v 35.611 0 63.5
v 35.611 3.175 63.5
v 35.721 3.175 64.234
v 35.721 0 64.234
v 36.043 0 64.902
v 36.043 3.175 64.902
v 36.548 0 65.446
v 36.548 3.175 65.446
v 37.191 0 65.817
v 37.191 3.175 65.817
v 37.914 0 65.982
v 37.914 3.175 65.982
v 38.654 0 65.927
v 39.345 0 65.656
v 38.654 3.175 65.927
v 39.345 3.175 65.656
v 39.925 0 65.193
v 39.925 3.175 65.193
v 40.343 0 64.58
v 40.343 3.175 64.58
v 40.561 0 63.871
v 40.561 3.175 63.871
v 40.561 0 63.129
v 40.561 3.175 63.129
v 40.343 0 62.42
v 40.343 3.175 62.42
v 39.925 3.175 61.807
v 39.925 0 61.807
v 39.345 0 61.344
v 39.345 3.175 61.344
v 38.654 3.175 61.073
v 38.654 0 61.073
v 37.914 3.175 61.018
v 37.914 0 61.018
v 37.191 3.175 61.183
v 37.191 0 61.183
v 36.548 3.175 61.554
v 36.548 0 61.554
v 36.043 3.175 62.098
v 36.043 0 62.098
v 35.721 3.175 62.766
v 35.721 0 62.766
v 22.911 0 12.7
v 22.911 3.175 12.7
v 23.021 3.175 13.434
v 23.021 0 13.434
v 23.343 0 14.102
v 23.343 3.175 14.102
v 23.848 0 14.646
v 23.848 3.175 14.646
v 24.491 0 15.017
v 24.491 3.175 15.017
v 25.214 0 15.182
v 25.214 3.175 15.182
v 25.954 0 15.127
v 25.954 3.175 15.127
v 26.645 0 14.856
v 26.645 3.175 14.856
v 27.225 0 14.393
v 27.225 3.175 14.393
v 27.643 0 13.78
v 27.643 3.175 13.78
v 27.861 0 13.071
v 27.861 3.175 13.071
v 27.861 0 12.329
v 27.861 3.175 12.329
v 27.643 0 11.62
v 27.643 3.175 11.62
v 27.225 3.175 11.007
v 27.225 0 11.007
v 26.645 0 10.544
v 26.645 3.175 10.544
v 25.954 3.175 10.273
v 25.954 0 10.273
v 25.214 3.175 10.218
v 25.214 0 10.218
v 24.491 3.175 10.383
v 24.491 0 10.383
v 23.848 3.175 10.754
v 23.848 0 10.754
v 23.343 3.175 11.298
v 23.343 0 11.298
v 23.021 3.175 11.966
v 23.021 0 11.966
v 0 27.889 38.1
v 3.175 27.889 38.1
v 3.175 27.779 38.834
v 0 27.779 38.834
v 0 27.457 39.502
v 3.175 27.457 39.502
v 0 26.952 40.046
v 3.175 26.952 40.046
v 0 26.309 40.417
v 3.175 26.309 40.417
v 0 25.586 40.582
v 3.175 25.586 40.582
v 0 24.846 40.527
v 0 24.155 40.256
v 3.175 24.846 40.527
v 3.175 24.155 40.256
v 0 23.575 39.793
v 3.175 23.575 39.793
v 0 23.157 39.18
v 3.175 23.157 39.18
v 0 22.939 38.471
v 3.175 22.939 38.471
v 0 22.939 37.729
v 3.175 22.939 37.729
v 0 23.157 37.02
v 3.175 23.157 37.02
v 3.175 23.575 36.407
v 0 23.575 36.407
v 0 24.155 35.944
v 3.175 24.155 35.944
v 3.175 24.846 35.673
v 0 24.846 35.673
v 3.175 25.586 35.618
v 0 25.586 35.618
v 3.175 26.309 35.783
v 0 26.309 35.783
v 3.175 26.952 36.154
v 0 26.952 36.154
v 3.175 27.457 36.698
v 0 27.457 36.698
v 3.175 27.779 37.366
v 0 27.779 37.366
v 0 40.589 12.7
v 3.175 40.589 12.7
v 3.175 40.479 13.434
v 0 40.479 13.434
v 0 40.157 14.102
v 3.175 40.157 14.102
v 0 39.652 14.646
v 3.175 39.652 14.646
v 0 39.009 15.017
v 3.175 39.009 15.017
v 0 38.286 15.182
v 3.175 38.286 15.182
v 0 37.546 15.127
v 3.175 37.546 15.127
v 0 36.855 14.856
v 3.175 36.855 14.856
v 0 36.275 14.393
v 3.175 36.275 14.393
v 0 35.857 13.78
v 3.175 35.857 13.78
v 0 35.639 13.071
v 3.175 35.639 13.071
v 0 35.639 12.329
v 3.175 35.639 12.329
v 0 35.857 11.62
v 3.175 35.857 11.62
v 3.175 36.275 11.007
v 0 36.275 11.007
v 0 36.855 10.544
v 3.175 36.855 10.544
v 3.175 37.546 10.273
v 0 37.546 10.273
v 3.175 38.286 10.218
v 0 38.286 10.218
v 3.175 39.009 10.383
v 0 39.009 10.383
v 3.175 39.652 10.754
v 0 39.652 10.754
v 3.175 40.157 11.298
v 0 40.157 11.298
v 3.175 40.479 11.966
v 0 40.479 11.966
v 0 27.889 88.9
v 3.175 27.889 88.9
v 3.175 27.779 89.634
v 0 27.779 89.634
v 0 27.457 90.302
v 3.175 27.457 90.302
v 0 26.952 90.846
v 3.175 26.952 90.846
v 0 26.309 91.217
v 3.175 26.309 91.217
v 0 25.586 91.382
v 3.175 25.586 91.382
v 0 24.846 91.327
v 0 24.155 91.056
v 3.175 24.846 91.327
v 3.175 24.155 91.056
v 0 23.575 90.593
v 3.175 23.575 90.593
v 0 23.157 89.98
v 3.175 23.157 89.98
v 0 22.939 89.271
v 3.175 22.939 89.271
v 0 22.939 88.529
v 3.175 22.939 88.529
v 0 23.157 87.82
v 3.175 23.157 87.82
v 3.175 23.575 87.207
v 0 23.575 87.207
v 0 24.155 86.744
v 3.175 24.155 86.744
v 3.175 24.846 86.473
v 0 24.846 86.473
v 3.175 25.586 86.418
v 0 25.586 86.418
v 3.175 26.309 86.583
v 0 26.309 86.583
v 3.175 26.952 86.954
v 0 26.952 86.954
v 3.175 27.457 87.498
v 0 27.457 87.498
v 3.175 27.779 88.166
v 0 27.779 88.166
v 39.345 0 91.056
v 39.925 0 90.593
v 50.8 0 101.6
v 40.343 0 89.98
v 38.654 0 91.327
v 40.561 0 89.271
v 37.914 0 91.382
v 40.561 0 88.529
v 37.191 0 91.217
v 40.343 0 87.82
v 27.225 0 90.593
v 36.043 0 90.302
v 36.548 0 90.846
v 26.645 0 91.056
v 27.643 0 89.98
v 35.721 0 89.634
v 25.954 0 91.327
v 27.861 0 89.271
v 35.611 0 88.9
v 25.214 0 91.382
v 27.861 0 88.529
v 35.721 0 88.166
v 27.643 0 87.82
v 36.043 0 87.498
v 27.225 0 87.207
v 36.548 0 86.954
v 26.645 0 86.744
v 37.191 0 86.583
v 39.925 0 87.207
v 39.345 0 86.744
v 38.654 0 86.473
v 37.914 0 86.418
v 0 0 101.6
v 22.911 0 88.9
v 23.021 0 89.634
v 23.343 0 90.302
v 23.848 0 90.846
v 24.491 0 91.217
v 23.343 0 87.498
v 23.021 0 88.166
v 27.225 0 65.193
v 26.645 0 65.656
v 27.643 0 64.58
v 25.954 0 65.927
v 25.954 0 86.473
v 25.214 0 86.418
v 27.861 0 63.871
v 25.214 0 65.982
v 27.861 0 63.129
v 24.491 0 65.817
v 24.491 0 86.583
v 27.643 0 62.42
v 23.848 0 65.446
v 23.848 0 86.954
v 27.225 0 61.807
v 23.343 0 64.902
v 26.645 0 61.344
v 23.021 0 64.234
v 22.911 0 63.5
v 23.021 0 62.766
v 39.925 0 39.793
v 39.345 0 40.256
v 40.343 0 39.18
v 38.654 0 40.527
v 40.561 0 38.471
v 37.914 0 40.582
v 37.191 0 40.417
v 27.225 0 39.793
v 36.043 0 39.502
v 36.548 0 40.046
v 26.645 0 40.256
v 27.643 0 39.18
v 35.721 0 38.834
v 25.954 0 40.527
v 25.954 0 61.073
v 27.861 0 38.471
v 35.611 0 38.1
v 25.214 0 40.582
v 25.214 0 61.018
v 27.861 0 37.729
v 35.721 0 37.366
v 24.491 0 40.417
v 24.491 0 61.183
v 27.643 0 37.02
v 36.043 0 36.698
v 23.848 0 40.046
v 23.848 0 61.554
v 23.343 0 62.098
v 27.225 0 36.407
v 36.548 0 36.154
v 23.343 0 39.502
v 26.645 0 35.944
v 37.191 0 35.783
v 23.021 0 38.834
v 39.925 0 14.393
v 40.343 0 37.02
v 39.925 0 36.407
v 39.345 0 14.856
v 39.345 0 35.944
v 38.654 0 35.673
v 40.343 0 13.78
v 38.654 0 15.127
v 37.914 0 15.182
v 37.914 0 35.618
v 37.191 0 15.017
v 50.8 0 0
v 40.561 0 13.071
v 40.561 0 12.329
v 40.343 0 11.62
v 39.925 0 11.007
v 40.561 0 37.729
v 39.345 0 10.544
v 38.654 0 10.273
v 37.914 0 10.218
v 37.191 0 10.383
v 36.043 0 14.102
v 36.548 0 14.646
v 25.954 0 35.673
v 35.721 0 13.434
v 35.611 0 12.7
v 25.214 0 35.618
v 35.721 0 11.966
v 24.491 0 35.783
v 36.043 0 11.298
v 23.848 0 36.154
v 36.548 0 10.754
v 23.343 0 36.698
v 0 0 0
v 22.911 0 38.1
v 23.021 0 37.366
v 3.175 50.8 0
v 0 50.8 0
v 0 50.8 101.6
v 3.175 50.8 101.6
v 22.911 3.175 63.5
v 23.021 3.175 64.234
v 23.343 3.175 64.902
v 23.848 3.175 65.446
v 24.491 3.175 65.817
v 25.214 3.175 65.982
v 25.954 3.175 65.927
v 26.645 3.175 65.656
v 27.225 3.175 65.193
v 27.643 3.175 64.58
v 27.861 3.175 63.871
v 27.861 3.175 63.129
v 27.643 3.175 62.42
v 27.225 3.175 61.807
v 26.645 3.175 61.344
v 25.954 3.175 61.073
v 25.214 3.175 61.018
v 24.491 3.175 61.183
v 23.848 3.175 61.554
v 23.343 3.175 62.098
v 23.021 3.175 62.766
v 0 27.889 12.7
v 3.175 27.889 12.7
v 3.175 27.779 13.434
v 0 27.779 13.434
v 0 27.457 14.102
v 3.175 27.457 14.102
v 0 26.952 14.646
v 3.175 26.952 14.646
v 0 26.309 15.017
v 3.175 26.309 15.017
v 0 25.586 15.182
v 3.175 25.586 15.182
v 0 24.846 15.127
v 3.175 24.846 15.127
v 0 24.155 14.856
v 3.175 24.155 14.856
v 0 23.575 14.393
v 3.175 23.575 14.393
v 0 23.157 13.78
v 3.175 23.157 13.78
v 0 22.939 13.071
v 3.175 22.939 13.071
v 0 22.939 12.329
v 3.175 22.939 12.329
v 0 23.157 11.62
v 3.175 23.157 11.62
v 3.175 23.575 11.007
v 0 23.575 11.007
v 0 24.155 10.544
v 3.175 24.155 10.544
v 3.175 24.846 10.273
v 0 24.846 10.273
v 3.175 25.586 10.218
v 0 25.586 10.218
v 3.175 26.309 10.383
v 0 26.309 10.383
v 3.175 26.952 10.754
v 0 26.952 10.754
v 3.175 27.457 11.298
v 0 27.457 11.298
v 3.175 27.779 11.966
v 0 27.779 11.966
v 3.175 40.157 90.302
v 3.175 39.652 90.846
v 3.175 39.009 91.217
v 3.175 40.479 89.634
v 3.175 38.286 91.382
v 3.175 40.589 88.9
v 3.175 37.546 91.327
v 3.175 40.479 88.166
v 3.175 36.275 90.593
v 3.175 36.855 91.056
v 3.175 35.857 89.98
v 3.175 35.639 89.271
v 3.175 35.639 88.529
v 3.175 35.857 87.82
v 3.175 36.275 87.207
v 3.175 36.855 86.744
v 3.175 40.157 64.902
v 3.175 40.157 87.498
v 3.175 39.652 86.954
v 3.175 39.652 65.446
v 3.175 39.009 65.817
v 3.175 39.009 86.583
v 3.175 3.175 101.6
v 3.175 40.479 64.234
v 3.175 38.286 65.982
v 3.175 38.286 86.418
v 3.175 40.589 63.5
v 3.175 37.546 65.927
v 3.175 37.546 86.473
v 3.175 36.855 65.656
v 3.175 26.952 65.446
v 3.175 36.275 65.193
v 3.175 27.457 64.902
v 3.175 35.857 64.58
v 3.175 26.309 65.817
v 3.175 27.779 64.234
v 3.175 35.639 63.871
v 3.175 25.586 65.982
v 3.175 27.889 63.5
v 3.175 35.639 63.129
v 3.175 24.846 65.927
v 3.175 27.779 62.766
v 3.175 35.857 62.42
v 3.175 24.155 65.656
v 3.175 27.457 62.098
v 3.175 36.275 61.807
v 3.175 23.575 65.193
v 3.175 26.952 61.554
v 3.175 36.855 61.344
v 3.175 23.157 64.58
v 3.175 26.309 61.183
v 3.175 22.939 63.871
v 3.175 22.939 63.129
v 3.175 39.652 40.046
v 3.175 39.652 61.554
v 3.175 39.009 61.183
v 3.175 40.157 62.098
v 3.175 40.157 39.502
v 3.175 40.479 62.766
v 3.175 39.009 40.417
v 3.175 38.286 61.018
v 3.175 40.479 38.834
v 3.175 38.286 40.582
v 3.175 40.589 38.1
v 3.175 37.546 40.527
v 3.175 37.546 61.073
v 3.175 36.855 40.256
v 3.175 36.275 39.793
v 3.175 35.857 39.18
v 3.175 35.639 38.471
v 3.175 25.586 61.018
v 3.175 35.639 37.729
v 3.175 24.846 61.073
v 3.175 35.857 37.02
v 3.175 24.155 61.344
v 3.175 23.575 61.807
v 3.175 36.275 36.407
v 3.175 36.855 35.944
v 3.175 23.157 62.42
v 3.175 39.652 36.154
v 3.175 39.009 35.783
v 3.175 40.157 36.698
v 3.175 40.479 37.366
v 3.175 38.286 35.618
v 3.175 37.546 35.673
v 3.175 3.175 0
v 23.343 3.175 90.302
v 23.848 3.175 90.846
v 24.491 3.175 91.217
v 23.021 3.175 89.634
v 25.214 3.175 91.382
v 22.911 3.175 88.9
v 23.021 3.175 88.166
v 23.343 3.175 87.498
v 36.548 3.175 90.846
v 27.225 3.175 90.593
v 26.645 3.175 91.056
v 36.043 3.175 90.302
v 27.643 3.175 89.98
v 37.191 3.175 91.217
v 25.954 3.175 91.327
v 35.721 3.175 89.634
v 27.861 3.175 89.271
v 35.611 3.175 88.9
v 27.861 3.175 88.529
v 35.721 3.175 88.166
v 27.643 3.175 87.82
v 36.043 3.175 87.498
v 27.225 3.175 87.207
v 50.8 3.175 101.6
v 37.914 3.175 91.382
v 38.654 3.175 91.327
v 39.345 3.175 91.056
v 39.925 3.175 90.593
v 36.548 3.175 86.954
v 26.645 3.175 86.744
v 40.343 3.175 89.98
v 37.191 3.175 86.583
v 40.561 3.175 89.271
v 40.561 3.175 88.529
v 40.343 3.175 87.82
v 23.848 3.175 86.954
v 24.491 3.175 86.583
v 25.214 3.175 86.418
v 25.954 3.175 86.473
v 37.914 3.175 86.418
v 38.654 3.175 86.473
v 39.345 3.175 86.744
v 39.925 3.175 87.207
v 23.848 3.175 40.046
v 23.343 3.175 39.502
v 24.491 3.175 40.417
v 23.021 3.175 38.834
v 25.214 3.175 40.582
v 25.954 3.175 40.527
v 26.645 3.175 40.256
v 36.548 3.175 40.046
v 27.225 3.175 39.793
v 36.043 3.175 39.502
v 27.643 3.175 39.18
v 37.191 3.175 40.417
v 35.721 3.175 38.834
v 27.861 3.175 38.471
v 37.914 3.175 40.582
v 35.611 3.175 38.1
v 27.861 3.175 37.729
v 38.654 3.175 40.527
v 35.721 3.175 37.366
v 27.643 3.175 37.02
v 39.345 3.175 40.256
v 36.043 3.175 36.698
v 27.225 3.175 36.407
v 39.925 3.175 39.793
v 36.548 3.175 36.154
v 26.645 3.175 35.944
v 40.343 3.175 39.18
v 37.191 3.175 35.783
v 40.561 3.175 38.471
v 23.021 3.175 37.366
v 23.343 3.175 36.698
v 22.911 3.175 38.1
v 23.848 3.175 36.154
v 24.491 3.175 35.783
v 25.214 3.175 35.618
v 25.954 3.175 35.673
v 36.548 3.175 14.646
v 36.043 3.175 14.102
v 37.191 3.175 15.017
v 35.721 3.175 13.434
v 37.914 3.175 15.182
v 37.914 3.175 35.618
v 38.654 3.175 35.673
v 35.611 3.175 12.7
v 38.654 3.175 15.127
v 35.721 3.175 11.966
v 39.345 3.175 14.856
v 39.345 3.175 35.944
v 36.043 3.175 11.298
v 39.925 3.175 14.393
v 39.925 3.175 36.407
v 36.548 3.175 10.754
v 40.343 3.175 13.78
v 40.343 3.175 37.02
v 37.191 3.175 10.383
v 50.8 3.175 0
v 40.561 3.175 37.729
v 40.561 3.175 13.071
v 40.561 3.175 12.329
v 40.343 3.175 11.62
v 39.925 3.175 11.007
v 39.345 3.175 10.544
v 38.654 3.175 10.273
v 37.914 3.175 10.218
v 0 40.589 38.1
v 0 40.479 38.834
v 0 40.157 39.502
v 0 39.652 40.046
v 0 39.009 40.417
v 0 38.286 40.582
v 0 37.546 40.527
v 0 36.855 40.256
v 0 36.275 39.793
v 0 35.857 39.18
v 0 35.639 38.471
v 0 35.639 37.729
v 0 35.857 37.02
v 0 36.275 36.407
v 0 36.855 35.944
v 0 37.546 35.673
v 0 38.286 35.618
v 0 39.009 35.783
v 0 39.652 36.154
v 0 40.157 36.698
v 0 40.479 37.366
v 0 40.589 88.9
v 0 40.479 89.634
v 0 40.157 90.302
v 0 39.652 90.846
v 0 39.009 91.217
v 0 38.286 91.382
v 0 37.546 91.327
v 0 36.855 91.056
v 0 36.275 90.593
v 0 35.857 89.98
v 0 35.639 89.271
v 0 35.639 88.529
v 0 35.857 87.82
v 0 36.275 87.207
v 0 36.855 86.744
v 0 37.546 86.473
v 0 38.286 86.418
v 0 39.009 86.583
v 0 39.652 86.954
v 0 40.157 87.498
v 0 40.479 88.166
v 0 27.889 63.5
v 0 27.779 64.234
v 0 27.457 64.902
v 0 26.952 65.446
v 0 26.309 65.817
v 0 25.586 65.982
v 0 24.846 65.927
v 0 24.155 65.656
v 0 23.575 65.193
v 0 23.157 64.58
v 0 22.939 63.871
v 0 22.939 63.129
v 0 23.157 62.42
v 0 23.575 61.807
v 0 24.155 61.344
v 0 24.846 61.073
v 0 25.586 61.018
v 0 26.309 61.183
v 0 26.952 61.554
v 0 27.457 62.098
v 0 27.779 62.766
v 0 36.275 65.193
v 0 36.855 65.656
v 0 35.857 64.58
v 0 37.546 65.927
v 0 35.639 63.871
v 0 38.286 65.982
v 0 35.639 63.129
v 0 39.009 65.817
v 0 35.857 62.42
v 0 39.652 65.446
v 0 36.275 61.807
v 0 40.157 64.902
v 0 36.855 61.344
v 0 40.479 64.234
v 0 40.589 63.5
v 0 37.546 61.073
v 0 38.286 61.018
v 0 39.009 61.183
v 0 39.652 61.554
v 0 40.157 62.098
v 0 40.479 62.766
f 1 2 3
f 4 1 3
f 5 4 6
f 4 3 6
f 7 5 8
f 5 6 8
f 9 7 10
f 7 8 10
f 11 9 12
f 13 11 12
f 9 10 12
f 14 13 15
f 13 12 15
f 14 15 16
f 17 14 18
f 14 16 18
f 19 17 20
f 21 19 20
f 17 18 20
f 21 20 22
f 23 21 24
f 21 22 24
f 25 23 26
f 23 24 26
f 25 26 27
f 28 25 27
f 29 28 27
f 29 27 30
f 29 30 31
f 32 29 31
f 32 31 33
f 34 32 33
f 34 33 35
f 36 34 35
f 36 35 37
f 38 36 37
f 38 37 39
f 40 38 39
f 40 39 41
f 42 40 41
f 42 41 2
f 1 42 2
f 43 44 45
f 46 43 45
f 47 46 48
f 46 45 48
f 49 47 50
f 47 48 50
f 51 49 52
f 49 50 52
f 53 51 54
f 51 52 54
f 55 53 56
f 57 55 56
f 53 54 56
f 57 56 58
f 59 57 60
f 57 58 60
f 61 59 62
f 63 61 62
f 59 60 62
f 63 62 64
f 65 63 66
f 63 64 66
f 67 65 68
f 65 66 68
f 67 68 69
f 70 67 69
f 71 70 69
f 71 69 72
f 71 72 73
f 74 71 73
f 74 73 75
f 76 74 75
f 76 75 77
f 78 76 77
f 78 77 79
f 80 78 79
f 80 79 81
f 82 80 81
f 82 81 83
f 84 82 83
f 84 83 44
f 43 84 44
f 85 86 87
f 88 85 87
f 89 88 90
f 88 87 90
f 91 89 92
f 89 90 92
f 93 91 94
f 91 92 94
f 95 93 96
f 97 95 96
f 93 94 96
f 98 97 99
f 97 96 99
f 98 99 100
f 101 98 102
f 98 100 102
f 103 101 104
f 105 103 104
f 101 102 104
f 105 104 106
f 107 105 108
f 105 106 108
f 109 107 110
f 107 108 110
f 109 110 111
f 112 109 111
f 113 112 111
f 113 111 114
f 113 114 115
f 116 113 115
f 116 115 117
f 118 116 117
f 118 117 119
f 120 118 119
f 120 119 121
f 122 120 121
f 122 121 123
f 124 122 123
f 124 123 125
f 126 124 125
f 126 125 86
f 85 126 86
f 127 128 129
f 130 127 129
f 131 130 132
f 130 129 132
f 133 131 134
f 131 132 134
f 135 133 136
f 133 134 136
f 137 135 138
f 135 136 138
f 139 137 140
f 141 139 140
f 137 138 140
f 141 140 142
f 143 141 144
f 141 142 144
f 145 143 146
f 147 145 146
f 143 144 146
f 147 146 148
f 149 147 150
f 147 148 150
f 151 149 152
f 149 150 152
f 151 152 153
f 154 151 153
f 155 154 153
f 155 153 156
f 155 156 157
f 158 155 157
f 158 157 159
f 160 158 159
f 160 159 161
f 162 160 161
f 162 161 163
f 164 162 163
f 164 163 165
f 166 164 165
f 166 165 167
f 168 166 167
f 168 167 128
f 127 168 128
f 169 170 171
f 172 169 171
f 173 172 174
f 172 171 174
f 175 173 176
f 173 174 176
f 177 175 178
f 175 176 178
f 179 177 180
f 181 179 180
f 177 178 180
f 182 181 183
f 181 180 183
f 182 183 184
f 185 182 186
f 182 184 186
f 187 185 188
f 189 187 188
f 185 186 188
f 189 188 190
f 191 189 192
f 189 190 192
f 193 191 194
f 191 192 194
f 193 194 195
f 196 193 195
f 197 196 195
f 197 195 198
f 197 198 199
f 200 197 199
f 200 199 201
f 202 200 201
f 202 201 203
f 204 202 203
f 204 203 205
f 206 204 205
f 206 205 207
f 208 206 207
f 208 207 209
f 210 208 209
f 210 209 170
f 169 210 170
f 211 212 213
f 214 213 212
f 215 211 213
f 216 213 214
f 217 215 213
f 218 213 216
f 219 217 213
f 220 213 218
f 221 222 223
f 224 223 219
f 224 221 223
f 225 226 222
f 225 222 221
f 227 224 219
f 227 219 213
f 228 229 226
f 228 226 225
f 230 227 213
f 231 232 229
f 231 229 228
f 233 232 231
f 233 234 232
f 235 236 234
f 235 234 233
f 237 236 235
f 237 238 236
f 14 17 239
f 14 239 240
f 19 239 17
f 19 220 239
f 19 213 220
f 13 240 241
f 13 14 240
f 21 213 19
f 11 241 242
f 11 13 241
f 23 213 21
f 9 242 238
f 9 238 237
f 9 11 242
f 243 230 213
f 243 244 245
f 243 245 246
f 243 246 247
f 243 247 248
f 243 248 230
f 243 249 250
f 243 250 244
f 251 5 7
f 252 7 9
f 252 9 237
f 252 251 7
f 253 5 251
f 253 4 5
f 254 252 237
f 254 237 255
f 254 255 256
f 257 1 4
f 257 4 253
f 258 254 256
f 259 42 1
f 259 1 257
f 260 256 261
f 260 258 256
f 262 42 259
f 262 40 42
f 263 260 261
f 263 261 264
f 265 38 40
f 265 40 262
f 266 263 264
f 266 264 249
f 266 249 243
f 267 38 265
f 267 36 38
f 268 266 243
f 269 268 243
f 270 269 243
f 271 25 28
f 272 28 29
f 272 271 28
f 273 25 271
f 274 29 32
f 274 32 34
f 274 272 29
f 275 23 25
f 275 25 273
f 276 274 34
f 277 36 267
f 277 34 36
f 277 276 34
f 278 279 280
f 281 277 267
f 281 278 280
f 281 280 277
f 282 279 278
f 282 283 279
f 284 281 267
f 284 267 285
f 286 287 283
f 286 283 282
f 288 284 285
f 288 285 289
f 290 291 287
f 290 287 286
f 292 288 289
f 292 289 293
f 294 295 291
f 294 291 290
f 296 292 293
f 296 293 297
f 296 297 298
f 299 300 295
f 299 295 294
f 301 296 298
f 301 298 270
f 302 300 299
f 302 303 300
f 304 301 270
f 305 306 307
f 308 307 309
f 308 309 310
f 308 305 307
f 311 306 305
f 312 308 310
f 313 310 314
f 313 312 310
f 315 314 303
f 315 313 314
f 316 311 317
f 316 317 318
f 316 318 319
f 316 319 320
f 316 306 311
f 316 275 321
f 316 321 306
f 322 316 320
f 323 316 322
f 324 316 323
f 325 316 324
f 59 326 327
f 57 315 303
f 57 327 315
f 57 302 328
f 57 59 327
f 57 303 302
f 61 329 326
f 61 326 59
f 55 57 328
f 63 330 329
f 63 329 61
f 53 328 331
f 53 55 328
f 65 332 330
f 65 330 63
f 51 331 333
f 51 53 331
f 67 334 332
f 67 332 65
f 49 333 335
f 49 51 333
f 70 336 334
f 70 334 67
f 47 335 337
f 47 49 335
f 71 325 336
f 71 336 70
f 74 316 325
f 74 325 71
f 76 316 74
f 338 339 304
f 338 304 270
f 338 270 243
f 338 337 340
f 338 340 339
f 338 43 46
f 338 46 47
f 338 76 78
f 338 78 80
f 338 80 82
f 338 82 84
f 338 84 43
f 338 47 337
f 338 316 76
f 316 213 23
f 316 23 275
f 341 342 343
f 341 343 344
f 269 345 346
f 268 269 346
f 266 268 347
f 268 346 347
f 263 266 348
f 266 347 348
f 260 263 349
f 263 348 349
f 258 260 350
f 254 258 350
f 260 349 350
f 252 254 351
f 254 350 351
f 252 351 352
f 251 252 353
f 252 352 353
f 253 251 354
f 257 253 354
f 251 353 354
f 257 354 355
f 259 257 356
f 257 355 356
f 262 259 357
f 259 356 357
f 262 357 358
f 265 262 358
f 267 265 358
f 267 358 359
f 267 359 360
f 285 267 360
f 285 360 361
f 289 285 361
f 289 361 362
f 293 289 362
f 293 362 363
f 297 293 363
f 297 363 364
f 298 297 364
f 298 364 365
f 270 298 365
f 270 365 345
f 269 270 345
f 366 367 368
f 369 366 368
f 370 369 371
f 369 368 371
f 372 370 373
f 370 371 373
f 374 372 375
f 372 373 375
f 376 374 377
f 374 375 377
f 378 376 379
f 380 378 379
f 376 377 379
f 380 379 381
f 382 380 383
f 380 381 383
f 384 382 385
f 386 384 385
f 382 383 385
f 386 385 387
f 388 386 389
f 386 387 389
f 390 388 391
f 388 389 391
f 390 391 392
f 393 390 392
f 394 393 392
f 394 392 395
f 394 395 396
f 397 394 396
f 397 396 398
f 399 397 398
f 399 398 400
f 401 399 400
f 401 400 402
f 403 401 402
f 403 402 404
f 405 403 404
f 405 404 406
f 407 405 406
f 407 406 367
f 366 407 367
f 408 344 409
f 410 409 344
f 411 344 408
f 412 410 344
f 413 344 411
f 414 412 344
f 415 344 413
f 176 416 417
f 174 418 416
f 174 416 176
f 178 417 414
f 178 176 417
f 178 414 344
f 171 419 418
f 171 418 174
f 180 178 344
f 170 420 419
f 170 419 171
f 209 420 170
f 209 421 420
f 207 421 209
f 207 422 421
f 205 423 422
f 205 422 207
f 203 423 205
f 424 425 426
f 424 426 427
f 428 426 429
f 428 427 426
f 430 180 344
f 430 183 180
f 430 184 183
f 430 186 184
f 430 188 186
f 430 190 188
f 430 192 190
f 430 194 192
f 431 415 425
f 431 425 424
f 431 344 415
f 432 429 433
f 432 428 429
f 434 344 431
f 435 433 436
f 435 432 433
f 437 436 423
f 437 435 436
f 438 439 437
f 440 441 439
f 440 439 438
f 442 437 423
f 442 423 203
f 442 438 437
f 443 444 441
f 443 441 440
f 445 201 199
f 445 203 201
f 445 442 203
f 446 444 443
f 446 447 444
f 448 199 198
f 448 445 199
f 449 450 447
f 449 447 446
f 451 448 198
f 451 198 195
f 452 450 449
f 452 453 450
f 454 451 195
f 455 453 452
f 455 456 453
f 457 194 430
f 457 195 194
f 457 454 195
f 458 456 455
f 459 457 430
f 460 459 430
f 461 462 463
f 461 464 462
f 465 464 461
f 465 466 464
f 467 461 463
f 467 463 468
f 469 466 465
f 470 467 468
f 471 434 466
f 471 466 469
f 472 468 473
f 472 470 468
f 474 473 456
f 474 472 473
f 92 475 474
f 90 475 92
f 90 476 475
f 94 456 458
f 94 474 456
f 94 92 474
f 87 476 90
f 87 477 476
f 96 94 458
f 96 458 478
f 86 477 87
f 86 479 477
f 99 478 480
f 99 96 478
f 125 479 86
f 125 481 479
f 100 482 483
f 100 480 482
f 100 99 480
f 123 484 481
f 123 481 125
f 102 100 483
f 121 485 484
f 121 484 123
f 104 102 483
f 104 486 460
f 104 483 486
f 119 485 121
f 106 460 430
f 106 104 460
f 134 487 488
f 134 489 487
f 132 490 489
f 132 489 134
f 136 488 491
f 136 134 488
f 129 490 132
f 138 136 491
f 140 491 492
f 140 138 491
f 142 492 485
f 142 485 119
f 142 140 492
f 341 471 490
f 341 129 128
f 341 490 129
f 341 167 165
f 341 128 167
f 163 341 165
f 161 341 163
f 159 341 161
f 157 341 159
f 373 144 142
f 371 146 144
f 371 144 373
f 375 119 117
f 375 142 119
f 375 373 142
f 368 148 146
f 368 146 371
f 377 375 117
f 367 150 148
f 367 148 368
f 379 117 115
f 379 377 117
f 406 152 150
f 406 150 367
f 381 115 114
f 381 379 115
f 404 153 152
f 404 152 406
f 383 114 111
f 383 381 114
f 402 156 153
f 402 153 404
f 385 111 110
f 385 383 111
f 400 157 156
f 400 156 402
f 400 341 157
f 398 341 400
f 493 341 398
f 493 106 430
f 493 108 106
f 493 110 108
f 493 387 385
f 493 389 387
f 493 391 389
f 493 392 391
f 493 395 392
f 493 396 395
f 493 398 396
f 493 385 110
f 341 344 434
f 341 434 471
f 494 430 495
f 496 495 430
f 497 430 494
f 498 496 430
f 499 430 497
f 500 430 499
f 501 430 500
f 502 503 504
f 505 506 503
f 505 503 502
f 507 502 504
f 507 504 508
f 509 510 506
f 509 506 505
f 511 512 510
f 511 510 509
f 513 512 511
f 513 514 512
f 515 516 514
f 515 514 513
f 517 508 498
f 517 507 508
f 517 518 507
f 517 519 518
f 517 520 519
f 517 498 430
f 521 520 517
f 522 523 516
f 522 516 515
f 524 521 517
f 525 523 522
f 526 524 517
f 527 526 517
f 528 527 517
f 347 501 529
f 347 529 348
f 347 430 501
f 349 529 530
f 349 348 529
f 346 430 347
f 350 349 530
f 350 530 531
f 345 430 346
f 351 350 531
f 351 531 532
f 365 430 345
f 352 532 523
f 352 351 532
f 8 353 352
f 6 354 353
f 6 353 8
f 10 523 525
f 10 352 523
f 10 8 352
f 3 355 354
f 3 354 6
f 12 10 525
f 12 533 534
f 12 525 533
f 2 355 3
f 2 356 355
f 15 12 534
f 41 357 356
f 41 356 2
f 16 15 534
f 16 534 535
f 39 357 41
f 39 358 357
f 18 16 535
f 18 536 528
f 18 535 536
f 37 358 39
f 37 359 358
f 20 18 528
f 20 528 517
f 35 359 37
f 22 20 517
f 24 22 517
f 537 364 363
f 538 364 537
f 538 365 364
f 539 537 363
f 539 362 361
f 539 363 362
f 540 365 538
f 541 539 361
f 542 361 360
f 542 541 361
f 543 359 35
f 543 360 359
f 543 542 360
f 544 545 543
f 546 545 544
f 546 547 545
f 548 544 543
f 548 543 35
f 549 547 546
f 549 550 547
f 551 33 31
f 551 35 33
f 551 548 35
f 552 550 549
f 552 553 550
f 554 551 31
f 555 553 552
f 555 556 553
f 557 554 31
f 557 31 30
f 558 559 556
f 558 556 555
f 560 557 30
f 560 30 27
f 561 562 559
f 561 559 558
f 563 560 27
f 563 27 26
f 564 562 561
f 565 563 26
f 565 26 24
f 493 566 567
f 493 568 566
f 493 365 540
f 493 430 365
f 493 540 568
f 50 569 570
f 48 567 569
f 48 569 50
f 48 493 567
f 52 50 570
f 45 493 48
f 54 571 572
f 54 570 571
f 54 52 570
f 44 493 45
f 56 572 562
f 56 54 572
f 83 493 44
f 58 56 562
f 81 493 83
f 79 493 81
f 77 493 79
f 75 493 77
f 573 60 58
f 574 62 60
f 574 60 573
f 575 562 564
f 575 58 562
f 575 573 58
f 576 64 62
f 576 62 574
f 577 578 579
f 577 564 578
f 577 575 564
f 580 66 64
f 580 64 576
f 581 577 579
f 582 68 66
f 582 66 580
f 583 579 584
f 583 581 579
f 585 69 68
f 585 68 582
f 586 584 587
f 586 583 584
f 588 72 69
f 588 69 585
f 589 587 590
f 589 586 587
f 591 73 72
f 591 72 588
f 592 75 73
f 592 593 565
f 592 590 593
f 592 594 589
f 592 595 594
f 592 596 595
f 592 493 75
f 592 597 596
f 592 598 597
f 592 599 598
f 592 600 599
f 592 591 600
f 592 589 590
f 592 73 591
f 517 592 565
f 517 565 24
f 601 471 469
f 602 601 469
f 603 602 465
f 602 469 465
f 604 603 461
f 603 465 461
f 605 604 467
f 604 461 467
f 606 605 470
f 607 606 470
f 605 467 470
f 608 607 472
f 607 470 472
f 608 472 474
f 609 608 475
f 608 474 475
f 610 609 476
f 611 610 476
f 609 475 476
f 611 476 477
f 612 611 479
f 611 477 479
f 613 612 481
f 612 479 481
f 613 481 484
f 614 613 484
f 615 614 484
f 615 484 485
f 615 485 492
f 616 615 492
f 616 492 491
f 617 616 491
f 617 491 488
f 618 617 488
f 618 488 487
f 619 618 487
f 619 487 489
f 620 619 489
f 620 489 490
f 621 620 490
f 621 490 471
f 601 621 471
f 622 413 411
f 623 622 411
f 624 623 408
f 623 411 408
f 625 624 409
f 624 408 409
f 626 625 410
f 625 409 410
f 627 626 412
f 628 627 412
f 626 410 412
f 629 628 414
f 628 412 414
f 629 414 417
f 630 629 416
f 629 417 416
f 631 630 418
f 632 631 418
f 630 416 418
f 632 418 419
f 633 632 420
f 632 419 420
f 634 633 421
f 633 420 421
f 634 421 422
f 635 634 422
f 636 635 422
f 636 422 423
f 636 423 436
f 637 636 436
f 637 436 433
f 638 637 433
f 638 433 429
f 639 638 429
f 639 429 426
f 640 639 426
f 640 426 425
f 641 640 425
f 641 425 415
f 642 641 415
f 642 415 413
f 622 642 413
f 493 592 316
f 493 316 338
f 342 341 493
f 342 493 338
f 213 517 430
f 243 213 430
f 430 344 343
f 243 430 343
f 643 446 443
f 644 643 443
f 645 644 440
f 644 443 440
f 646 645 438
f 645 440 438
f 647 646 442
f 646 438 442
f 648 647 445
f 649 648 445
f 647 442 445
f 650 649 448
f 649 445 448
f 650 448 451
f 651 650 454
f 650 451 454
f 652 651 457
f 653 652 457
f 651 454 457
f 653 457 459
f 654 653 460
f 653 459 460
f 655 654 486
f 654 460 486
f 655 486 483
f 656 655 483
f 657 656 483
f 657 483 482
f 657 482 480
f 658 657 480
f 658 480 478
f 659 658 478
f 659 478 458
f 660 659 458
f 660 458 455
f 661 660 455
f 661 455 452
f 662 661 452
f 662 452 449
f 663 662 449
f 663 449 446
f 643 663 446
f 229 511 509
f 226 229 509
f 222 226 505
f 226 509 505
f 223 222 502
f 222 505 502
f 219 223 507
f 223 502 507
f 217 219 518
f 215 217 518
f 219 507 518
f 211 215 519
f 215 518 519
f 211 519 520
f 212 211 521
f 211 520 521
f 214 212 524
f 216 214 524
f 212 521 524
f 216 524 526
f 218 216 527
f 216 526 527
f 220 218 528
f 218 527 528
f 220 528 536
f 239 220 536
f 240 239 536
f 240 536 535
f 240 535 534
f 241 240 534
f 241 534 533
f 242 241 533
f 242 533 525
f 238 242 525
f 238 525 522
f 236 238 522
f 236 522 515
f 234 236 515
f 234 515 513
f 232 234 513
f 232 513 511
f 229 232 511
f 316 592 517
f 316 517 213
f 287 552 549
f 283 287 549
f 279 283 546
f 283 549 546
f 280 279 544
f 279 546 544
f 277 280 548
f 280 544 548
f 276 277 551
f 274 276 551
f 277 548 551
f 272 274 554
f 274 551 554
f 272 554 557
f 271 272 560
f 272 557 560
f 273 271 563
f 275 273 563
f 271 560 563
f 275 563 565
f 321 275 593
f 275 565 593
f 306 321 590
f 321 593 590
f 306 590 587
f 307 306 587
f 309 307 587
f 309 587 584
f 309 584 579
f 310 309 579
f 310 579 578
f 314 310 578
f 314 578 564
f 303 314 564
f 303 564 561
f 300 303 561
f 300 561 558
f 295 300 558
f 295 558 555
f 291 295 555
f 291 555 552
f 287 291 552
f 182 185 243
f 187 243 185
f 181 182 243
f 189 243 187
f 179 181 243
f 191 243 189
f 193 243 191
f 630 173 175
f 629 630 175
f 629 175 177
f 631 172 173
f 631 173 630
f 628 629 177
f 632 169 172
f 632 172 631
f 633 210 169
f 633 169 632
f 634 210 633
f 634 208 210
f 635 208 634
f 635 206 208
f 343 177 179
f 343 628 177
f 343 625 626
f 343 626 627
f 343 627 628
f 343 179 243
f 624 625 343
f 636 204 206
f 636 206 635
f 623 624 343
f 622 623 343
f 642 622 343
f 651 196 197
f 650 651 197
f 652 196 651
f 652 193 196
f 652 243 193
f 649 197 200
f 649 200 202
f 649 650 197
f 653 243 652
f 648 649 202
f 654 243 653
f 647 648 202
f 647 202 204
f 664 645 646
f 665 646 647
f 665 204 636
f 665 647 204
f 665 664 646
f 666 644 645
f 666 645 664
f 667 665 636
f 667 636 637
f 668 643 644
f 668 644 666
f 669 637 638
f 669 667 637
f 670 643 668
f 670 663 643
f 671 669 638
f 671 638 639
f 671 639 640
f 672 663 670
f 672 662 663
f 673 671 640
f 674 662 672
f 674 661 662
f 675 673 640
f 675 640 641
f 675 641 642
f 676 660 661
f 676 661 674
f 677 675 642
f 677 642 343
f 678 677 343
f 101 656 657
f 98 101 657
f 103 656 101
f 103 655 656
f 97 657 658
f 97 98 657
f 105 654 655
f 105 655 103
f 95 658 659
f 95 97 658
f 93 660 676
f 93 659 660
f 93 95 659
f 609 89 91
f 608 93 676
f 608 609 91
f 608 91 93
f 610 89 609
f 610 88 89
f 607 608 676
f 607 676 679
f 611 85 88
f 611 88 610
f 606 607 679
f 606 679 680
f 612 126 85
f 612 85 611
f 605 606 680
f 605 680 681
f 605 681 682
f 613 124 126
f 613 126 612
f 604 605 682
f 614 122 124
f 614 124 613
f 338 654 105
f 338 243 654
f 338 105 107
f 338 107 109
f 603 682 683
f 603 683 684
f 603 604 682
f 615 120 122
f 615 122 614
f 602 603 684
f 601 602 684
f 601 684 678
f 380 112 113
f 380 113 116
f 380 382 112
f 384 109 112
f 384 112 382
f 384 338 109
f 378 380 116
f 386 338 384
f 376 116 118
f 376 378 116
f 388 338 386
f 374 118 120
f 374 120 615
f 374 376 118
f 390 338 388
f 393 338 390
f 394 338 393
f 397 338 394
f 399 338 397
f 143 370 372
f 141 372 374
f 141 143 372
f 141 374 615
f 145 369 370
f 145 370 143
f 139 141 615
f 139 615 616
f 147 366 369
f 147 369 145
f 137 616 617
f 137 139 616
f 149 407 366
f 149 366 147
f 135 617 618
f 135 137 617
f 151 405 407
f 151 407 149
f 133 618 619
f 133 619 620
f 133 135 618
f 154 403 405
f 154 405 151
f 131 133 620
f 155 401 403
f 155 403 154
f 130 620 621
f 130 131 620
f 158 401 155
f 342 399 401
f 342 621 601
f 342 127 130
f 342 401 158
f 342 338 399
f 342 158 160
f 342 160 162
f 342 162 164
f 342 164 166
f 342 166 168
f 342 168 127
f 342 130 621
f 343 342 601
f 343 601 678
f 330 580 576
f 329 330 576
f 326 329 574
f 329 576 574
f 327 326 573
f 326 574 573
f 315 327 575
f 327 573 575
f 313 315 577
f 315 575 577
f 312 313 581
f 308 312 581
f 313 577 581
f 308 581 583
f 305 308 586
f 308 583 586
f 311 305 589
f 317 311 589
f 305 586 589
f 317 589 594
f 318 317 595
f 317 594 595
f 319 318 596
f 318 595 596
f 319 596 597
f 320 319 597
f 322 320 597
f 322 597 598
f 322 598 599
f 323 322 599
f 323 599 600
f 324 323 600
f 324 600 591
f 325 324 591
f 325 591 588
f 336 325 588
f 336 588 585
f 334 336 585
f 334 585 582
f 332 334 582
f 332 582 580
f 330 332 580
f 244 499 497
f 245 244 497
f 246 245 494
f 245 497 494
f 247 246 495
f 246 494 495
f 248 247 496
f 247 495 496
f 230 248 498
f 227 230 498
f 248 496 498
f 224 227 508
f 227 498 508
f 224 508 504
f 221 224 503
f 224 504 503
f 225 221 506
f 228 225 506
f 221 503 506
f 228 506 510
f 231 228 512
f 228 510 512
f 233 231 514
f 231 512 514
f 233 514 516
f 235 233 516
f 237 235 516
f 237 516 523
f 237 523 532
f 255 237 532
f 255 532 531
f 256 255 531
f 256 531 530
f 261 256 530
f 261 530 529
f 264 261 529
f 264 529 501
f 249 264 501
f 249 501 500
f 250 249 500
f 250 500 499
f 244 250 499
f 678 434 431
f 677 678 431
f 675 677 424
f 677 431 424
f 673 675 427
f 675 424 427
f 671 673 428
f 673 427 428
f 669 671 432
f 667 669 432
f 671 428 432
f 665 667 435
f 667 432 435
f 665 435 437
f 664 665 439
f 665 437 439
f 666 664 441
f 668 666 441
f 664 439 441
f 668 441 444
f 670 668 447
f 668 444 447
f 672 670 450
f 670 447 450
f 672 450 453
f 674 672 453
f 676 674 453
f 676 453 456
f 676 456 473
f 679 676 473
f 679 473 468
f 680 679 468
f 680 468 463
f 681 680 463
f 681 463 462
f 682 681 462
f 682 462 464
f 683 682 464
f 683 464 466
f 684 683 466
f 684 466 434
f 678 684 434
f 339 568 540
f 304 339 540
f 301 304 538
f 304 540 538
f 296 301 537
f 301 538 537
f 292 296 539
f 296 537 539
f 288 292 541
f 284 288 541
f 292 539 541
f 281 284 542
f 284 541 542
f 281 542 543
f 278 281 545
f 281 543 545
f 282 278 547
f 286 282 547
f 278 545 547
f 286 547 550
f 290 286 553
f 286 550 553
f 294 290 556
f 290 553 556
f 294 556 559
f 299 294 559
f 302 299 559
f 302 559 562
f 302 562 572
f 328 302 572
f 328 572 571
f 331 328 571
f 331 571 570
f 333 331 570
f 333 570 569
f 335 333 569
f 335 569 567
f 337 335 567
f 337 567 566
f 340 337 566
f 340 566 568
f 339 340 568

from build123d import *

# Parameters (mm, degrees)
BOSS_EXTRUDE1_DEPTH = 101.6
SKETCH3_R           = 2.4892
CUT_EXTRUDE1_DEPTH  = 124.171996107
SKETCH4_R           = 2.4892
CUT_EXTRUDE2_DEPTH  = 124.171996107


with BuildPart() as part:
    # Sketch2 → Boss-Extrude1 (new body)
    with BuildSketch(Plane.XY):
        Polygon((0, 0), (0, 50.8), (3.175, 50.8), (3.175, 3.175), (50.8, 3.175), (50.8, 0), align=None)
    extrude(amount=BOSS_EXTRUDE1_DEPTH)

    # Sketch3 → Cut-Extrude1 (cut, through all)
    with BuildSketch(Plane(origin=(0, 3.175, 0), x_dir=(1, 0, 0), z_dir=(0, 1, 0))):
        with Locations(Location((25.4, -12.7, 0), (0, 0, 180))):
            Circle(SKETCH3_R)
        with Locations(Location((38.1, -12.7, 0), (0, 0, 180))):
            Circle(SKETCH3_R)
        with Locations(Location((38.1, -38.1, 0), (0, 0, 180))):
            Circle(SKETCH3_R)
        with Locations(Location((38.1, -63.5, 0), (0, 0, 180))):
            Circle(SKETCH3_R)
        with Locations(Location((38.1, -88.9, 0), (0, 0, 180))):
            Circle(SKETCH3_R)
        with Locations(Location((25.4, -38.1, 0), (0, 0, 180))):
            Circle(SKETCH3_R)
        with Locations(Location((25.4, -63.5, 0), (0, 0, 180))):
            Circle(SKETCH3_R)
        with Locations(Location((25.4, -88.9, 0), (0, 0, 180))):
            Circle(SKETCH3_R)
    extrude(amount=-CUT_EXTRUDE1_DEPTH, mode=Mode.SUBTRACT)

    # Sketch4 → Cut-Extrude2 (cut, through all)
    with BuildSketch(Plane(origin=(3.175, 0, 0), x_dir=(0, 0, -1), z_dir=(1, 0, 0))):
        with Locations(Location((-12.7, 25.4, 0), (0, 0, 90))):
            Circle(SKETCH4_R)
        with Locations(Location((-38.1, 25.4, 0), (0, 0, 90))):
            Circle(SKETCH4_R)
        with Locations(Location((-63.5, 25.4, 0), (0, 0, 90))):
            Circle(SKETCH4_R)
        with Locations(Location((-88.9, 25.4, 0), (0, 0, 90))):
            Circle(SKETCH4_R)
        with Locations(Location((-38.1, 38.1, 0), (0, 0, 90))):
            Circle(SKETCH4_R)
        with Locations(Location((-63.5, 38.1, 0), (0, 0, 90))):
            Circle(SKETCH4_R)
        with Locations(Location((-88.9, 38.1, 0), (0, 0, 90))):
            Circle(SKETCH4_R)
        with Locations(Location((-12.7, 38.1, 0), (0, 0, 90))):
            Circle(SKETCH4_R)
    extrude(amount=-CUT_EXTRUDE2_DEPTH, mode=Mode.SUBTRACT)


solid = part.part
